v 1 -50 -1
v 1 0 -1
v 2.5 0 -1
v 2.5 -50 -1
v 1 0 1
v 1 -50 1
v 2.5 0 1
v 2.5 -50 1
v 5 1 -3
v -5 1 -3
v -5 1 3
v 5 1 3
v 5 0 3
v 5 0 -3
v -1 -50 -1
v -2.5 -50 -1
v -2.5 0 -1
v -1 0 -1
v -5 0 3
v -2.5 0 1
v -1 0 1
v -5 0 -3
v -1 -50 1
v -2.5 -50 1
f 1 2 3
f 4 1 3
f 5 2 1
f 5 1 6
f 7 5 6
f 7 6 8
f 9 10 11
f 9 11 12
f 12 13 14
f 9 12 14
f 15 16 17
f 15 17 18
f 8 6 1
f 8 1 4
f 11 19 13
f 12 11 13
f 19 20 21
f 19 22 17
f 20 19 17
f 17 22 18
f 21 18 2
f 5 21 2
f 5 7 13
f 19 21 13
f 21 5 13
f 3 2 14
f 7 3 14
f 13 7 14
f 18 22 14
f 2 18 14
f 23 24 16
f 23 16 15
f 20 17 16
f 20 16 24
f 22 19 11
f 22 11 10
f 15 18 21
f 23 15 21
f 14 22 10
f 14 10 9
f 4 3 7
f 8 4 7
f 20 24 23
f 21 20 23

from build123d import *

# Parameters (mm, degrees)
SKETCH1_W           = 10
SKETCH1_H           = 6
BOSS_EXTRUDE1_DEPTH = 1
SKETCH2_W           = 1.5
SKETCH2_H           = 2
BOSS_EXTRUDE2_DEPTH = 50


with BuildPart() as part:
    # Sketch1 → Boss-Extrude1 (new body)
    with BuildSketch(Plane(origin=(0, 0, 0), x_dir=(1, 0, 0), z_dir=(0, 1, 0))):
        Rectangle(SKETCH1_W, SKETCH1_H)
    extrude(amount=BOSS_EXTRUDE1_DEPTH)

    # Sketch2 → Boss-Extrude2 (add)
    with BuildSketch(Plane.XZ):
        with Locations((-1.75, 0)):
            Rectangle(SKETCH2_W, SKETCH2_H)
        with Locations((1.75, 0)):
            Rectangle(SKETCH2_W, SKETCH2_H)
    extrude(amount=BOSS_EXTRUDE2_DEPTH)


solid = part.part
